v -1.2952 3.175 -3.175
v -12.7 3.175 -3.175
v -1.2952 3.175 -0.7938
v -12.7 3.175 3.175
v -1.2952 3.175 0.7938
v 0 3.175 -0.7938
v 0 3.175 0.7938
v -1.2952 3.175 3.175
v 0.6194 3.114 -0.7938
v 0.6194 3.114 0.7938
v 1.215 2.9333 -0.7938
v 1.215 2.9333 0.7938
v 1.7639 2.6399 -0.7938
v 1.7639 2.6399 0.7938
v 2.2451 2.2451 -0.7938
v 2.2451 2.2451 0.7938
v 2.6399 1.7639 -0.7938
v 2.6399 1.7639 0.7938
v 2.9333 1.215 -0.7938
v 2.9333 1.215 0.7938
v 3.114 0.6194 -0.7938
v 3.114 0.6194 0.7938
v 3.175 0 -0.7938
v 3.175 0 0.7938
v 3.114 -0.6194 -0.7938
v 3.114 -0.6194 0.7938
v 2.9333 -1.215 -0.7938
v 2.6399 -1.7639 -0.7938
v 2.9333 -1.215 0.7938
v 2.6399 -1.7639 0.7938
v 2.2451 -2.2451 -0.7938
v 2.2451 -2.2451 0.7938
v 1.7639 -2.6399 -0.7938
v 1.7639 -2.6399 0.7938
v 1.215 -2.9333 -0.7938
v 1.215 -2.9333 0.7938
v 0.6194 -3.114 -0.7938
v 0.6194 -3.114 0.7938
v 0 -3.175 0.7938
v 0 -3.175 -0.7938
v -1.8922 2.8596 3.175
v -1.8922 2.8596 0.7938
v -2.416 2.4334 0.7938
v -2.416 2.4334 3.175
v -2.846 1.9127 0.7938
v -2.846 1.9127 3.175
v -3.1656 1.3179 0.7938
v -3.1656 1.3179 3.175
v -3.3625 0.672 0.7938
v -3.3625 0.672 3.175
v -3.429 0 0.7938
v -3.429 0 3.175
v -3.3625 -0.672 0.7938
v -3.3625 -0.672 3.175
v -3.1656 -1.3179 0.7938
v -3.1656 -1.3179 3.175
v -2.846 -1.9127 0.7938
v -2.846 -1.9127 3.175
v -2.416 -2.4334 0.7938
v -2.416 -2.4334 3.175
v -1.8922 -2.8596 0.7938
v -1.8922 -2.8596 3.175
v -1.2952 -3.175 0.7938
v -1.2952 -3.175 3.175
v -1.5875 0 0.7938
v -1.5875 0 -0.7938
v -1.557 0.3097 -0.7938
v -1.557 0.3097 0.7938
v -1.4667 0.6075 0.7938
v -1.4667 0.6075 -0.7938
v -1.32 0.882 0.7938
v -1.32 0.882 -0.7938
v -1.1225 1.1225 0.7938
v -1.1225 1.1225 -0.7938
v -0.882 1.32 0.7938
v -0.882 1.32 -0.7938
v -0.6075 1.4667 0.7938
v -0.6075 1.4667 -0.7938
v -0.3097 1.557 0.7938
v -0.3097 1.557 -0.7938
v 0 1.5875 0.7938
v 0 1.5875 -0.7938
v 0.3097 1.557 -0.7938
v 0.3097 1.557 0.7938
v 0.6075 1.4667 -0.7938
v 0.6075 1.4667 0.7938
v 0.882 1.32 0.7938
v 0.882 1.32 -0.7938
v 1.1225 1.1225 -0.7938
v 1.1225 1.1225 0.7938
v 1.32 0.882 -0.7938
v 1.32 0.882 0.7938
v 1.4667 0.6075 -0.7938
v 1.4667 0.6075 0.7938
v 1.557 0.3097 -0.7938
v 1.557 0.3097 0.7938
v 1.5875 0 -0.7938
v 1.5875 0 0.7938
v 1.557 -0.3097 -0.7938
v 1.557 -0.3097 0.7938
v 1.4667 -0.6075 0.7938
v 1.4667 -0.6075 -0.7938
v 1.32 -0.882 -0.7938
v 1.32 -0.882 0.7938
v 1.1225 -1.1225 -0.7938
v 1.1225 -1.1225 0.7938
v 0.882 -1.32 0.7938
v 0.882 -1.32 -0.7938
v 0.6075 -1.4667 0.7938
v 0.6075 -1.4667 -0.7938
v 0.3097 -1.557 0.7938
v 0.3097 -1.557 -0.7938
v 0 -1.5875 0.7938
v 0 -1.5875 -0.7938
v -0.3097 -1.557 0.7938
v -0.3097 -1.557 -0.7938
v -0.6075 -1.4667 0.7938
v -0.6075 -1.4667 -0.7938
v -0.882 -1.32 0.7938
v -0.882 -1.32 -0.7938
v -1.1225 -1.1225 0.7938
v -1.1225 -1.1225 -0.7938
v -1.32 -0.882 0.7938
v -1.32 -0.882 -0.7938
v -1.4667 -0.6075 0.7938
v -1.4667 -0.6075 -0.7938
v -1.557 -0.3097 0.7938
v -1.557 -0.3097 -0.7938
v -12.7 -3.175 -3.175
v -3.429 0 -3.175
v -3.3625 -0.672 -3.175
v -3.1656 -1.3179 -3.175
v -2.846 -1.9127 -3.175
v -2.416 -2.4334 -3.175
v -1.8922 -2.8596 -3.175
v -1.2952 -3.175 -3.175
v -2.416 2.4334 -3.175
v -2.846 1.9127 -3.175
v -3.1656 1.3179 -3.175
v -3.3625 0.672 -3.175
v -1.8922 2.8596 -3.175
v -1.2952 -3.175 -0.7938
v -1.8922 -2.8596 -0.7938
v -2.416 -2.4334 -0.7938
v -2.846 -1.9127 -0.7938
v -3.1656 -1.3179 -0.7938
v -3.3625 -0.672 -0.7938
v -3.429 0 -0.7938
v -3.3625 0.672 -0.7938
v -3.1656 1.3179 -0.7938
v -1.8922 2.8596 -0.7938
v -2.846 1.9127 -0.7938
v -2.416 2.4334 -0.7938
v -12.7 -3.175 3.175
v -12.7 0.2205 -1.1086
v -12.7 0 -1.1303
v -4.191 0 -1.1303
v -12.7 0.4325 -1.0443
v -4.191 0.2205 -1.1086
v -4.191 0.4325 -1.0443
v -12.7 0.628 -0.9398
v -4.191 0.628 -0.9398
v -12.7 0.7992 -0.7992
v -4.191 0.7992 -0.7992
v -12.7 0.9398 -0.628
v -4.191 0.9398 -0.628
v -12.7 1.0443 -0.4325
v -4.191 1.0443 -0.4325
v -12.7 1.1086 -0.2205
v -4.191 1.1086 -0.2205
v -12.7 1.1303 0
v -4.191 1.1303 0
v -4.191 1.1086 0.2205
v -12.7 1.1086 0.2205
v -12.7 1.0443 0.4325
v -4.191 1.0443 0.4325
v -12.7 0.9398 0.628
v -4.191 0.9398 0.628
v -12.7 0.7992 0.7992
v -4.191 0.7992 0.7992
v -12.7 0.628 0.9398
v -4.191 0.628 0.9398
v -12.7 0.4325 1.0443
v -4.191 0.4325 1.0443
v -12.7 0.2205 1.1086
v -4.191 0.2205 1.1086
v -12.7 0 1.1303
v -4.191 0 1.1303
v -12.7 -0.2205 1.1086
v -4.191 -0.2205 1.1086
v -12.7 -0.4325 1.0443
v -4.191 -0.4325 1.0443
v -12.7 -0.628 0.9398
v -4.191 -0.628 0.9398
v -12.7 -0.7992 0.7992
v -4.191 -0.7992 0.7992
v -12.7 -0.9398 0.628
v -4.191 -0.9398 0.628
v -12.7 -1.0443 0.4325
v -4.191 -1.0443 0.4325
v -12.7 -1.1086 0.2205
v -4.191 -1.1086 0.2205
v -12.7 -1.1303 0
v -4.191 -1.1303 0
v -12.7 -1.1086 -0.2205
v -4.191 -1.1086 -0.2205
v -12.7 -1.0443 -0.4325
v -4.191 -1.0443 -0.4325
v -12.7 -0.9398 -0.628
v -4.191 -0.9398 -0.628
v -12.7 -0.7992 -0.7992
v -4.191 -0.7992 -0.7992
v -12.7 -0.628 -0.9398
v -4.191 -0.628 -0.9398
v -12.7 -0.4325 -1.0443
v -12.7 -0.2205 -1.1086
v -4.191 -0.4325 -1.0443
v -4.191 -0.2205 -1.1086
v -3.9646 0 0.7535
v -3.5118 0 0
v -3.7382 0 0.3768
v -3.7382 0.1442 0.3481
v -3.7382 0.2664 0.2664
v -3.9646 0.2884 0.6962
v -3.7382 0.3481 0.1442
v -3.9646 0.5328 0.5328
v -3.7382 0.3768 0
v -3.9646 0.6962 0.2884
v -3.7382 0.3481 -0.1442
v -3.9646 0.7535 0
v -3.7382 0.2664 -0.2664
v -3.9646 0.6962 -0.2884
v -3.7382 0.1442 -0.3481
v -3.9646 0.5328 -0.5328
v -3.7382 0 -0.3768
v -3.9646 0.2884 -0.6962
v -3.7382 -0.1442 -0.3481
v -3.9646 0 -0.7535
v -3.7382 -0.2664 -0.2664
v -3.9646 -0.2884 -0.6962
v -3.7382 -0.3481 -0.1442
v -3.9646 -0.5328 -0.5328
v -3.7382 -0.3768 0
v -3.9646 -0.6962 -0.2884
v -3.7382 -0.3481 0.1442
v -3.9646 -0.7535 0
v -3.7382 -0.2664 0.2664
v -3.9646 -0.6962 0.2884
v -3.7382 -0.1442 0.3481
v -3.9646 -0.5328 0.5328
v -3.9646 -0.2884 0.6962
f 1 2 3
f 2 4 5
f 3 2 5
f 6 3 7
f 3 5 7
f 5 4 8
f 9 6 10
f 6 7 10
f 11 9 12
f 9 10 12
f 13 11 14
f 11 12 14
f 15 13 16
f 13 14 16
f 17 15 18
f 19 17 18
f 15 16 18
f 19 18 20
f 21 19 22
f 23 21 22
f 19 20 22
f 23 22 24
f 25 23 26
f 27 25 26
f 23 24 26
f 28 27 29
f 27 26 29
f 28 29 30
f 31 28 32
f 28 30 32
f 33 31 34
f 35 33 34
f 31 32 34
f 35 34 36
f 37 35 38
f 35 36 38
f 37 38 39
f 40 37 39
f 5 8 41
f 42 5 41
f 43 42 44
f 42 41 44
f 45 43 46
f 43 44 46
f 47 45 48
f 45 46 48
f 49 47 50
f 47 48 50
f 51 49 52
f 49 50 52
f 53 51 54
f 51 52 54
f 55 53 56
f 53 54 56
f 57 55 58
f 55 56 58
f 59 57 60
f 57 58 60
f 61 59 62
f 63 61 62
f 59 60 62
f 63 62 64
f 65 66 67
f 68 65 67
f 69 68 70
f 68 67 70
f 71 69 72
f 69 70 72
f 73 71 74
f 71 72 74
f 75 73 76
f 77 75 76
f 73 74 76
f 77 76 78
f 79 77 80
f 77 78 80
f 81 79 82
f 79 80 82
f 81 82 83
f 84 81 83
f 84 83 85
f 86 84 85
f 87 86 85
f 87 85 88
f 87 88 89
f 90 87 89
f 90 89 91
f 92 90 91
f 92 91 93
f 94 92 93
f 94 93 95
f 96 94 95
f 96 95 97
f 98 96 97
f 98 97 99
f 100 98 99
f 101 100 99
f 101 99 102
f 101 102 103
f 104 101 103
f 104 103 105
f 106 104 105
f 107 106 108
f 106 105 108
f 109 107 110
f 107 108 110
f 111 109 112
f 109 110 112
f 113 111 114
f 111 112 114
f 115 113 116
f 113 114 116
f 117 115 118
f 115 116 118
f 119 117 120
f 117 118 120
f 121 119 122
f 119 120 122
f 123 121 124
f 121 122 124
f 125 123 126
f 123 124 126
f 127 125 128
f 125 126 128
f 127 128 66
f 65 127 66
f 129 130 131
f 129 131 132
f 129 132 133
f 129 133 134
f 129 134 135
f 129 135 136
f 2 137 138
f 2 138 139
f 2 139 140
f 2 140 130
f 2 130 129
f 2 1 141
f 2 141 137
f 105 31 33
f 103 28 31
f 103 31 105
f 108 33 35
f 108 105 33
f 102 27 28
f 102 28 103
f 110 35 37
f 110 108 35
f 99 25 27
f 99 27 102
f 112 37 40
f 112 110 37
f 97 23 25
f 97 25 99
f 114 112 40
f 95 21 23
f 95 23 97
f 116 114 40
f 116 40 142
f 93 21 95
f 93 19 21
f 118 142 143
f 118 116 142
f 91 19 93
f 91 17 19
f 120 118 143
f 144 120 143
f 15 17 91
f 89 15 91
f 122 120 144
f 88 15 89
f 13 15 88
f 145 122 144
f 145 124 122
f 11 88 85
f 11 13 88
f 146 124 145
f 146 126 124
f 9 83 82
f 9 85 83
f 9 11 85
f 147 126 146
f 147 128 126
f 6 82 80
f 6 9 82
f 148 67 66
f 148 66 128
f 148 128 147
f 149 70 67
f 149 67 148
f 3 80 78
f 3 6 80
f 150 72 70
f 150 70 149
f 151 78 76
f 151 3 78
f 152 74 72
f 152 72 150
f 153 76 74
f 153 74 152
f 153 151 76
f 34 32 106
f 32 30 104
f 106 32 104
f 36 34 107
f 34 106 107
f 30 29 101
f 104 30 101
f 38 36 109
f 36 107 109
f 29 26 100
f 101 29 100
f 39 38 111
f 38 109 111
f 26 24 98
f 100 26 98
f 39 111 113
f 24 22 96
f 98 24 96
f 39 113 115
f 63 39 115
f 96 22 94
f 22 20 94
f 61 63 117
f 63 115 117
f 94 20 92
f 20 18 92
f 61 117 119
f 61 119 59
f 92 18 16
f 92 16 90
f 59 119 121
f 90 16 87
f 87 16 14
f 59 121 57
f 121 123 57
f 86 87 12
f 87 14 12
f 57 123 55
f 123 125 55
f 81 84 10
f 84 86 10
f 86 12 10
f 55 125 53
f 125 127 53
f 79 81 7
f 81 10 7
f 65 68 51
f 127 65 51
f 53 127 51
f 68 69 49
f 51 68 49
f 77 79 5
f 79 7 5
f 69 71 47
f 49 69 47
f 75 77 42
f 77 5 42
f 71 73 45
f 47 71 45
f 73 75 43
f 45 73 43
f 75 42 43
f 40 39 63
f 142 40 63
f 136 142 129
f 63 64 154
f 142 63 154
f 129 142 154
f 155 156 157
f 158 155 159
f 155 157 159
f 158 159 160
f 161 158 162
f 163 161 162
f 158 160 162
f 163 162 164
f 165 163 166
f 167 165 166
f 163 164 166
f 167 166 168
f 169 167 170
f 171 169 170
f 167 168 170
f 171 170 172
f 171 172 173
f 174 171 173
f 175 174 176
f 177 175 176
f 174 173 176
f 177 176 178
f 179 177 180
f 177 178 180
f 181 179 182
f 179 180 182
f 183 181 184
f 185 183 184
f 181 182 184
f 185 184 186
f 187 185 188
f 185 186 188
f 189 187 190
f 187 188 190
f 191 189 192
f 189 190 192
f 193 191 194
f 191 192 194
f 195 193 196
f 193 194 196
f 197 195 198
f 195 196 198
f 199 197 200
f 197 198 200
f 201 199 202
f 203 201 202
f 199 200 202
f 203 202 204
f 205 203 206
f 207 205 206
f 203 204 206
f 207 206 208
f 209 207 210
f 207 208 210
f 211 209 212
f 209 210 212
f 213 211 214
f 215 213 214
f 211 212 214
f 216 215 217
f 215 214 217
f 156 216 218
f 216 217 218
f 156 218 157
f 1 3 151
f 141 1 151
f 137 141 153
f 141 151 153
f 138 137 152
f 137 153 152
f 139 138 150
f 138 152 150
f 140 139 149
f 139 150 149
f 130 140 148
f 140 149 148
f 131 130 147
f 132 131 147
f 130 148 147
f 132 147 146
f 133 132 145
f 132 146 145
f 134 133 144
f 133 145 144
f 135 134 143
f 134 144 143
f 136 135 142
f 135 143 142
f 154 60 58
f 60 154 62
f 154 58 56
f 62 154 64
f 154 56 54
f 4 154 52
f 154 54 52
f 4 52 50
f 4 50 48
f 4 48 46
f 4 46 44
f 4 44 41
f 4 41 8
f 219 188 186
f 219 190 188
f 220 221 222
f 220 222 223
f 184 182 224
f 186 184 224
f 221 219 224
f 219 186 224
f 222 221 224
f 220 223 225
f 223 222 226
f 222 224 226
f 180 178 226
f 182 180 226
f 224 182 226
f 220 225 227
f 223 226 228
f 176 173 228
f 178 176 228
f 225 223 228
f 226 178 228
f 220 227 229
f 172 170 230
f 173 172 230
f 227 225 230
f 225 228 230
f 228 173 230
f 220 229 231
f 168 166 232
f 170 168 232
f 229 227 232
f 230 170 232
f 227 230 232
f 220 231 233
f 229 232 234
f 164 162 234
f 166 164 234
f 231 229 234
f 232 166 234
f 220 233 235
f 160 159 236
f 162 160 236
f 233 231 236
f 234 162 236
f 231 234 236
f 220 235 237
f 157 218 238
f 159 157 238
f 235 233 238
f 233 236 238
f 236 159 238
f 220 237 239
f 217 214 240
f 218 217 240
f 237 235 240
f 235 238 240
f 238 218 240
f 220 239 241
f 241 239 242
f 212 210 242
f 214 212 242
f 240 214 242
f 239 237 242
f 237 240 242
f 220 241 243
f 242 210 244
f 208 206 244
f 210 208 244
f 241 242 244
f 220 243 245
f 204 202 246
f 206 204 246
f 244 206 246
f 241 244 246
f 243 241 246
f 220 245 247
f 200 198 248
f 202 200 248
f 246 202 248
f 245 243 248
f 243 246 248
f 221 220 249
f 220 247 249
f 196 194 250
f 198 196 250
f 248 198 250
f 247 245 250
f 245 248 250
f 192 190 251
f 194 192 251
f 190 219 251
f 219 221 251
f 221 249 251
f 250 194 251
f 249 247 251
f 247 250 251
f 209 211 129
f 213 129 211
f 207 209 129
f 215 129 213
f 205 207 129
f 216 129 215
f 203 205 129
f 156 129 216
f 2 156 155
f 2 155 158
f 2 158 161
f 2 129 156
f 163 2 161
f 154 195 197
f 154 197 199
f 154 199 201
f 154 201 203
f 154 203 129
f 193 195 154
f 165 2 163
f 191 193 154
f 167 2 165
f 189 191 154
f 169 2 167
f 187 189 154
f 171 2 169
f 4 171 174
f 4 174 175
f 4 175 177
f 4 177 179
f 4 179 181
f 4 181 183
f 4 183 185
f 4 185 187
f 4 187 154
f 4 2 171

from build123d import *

# Parameters (mm, degrees)
BOSS_EXTRUDE2_DEPTH              = 0.79375
SKETCH4_W                        = 6.35
SKETCH4_H                        = 6.35
BOSS_EXTRUDE3_DEPTH              = 6.35
BOSS_EXTRUDE4_DEPTH              = 3.175
F_4_40_TAPPED_HOLE3_D            = 2.2606
F_4_40_TAPPED_HOLE3_DEPTH        = 8.509
F_4_40_TAPPED_HOLE3_TIP          = 0.679152758
F_1_8_0_125_DIAMETER_HOLE1_D     = 3.175
F_1_8_0_125_DIAMETER_HOLE1_DEPTH = 1.5875


with BuildPart() as part:
    # Sketch2 → Boss-Extrude2 (new body, symmetric)
    with BuildSketch(Plane.XY):
        with BuildLine():
            Line((-6.35, 3.175), (0, 3.175))
            ThreePointArc((0, 3.175), (3.175, 0), (0, -3.175))
            Line((0, -3.175), (-6.35, -3.175))
            Line((-6.35, -3.175), (-6.35, 3.175))
        make_face()
    extrude(amount=BOSS_EXTRUDE2_DEPTH, both=True)

    # Sketch4 → Boss-Extrude3 (add)
    with BuildSketch(Plane.ZY.offset(6.35)):
        Rectangle(SKETCH4_W, SKETCH4_H)
    extrude(amount=BOSS_EXTRUDE3_DEPTH)

    # Sketch10 → Boss-Extrude4 (add, symmetric)
    with BuildSketch(Plane.XY):
        with BuildLine():
            Line((-6.35, 3.175), (-3.175, 3.175))
            Line((-3.175, 3.175), (-1.295150956, 3.175))
            ThreePointArc((-1.295150956, 3.175), (-3.429, 0), (-1.295150956, -3.175))
            Line((-1.295150956, -3.175), (-3.175, -3.175))
            Line((-3.175, -3.175), (-6.35, -3.175))
            Line((-6.35, -3.175), (-6.35, 3.175))
        make_face()
    extrude(amount=BOSS_EXTRUDE4_DEPTH, both=True)

    # #4-40 Tapped Hole3
    with Locations(Plane.ZY.offset(12.7)):
        with Locations((0, 0)):
            Hole(F_4_40_TAPPED_HOLE3_D / 2, depth=F_4_40_TAPPED_HOLE3_DEPTH)
            with Locations((0, 0, -(F_4_40_TAPPED_HOLE3_DEPTH + F_4_40_TAPPED_HOLE3_TIP / 2))):  # 118° drill point
                Cone(0, F_4_40_TAPPED_HOLE3_D / 2, F_4_40_TAPPED_HOLE3_TIP, mode=Mode.SUBTRACT)

    # 1/8 (0.125) Diameter Hole1
    with Locations(Plane.XY.offset(0.79375)):
        with Locations((0, 0)):
            Hole(F_1_8_0_125_DIAMETER_HOLE1_D / 2, depth=F_1_8_0_125_DIAMETER_HOLE1_DEPTH)


solid = part.part
